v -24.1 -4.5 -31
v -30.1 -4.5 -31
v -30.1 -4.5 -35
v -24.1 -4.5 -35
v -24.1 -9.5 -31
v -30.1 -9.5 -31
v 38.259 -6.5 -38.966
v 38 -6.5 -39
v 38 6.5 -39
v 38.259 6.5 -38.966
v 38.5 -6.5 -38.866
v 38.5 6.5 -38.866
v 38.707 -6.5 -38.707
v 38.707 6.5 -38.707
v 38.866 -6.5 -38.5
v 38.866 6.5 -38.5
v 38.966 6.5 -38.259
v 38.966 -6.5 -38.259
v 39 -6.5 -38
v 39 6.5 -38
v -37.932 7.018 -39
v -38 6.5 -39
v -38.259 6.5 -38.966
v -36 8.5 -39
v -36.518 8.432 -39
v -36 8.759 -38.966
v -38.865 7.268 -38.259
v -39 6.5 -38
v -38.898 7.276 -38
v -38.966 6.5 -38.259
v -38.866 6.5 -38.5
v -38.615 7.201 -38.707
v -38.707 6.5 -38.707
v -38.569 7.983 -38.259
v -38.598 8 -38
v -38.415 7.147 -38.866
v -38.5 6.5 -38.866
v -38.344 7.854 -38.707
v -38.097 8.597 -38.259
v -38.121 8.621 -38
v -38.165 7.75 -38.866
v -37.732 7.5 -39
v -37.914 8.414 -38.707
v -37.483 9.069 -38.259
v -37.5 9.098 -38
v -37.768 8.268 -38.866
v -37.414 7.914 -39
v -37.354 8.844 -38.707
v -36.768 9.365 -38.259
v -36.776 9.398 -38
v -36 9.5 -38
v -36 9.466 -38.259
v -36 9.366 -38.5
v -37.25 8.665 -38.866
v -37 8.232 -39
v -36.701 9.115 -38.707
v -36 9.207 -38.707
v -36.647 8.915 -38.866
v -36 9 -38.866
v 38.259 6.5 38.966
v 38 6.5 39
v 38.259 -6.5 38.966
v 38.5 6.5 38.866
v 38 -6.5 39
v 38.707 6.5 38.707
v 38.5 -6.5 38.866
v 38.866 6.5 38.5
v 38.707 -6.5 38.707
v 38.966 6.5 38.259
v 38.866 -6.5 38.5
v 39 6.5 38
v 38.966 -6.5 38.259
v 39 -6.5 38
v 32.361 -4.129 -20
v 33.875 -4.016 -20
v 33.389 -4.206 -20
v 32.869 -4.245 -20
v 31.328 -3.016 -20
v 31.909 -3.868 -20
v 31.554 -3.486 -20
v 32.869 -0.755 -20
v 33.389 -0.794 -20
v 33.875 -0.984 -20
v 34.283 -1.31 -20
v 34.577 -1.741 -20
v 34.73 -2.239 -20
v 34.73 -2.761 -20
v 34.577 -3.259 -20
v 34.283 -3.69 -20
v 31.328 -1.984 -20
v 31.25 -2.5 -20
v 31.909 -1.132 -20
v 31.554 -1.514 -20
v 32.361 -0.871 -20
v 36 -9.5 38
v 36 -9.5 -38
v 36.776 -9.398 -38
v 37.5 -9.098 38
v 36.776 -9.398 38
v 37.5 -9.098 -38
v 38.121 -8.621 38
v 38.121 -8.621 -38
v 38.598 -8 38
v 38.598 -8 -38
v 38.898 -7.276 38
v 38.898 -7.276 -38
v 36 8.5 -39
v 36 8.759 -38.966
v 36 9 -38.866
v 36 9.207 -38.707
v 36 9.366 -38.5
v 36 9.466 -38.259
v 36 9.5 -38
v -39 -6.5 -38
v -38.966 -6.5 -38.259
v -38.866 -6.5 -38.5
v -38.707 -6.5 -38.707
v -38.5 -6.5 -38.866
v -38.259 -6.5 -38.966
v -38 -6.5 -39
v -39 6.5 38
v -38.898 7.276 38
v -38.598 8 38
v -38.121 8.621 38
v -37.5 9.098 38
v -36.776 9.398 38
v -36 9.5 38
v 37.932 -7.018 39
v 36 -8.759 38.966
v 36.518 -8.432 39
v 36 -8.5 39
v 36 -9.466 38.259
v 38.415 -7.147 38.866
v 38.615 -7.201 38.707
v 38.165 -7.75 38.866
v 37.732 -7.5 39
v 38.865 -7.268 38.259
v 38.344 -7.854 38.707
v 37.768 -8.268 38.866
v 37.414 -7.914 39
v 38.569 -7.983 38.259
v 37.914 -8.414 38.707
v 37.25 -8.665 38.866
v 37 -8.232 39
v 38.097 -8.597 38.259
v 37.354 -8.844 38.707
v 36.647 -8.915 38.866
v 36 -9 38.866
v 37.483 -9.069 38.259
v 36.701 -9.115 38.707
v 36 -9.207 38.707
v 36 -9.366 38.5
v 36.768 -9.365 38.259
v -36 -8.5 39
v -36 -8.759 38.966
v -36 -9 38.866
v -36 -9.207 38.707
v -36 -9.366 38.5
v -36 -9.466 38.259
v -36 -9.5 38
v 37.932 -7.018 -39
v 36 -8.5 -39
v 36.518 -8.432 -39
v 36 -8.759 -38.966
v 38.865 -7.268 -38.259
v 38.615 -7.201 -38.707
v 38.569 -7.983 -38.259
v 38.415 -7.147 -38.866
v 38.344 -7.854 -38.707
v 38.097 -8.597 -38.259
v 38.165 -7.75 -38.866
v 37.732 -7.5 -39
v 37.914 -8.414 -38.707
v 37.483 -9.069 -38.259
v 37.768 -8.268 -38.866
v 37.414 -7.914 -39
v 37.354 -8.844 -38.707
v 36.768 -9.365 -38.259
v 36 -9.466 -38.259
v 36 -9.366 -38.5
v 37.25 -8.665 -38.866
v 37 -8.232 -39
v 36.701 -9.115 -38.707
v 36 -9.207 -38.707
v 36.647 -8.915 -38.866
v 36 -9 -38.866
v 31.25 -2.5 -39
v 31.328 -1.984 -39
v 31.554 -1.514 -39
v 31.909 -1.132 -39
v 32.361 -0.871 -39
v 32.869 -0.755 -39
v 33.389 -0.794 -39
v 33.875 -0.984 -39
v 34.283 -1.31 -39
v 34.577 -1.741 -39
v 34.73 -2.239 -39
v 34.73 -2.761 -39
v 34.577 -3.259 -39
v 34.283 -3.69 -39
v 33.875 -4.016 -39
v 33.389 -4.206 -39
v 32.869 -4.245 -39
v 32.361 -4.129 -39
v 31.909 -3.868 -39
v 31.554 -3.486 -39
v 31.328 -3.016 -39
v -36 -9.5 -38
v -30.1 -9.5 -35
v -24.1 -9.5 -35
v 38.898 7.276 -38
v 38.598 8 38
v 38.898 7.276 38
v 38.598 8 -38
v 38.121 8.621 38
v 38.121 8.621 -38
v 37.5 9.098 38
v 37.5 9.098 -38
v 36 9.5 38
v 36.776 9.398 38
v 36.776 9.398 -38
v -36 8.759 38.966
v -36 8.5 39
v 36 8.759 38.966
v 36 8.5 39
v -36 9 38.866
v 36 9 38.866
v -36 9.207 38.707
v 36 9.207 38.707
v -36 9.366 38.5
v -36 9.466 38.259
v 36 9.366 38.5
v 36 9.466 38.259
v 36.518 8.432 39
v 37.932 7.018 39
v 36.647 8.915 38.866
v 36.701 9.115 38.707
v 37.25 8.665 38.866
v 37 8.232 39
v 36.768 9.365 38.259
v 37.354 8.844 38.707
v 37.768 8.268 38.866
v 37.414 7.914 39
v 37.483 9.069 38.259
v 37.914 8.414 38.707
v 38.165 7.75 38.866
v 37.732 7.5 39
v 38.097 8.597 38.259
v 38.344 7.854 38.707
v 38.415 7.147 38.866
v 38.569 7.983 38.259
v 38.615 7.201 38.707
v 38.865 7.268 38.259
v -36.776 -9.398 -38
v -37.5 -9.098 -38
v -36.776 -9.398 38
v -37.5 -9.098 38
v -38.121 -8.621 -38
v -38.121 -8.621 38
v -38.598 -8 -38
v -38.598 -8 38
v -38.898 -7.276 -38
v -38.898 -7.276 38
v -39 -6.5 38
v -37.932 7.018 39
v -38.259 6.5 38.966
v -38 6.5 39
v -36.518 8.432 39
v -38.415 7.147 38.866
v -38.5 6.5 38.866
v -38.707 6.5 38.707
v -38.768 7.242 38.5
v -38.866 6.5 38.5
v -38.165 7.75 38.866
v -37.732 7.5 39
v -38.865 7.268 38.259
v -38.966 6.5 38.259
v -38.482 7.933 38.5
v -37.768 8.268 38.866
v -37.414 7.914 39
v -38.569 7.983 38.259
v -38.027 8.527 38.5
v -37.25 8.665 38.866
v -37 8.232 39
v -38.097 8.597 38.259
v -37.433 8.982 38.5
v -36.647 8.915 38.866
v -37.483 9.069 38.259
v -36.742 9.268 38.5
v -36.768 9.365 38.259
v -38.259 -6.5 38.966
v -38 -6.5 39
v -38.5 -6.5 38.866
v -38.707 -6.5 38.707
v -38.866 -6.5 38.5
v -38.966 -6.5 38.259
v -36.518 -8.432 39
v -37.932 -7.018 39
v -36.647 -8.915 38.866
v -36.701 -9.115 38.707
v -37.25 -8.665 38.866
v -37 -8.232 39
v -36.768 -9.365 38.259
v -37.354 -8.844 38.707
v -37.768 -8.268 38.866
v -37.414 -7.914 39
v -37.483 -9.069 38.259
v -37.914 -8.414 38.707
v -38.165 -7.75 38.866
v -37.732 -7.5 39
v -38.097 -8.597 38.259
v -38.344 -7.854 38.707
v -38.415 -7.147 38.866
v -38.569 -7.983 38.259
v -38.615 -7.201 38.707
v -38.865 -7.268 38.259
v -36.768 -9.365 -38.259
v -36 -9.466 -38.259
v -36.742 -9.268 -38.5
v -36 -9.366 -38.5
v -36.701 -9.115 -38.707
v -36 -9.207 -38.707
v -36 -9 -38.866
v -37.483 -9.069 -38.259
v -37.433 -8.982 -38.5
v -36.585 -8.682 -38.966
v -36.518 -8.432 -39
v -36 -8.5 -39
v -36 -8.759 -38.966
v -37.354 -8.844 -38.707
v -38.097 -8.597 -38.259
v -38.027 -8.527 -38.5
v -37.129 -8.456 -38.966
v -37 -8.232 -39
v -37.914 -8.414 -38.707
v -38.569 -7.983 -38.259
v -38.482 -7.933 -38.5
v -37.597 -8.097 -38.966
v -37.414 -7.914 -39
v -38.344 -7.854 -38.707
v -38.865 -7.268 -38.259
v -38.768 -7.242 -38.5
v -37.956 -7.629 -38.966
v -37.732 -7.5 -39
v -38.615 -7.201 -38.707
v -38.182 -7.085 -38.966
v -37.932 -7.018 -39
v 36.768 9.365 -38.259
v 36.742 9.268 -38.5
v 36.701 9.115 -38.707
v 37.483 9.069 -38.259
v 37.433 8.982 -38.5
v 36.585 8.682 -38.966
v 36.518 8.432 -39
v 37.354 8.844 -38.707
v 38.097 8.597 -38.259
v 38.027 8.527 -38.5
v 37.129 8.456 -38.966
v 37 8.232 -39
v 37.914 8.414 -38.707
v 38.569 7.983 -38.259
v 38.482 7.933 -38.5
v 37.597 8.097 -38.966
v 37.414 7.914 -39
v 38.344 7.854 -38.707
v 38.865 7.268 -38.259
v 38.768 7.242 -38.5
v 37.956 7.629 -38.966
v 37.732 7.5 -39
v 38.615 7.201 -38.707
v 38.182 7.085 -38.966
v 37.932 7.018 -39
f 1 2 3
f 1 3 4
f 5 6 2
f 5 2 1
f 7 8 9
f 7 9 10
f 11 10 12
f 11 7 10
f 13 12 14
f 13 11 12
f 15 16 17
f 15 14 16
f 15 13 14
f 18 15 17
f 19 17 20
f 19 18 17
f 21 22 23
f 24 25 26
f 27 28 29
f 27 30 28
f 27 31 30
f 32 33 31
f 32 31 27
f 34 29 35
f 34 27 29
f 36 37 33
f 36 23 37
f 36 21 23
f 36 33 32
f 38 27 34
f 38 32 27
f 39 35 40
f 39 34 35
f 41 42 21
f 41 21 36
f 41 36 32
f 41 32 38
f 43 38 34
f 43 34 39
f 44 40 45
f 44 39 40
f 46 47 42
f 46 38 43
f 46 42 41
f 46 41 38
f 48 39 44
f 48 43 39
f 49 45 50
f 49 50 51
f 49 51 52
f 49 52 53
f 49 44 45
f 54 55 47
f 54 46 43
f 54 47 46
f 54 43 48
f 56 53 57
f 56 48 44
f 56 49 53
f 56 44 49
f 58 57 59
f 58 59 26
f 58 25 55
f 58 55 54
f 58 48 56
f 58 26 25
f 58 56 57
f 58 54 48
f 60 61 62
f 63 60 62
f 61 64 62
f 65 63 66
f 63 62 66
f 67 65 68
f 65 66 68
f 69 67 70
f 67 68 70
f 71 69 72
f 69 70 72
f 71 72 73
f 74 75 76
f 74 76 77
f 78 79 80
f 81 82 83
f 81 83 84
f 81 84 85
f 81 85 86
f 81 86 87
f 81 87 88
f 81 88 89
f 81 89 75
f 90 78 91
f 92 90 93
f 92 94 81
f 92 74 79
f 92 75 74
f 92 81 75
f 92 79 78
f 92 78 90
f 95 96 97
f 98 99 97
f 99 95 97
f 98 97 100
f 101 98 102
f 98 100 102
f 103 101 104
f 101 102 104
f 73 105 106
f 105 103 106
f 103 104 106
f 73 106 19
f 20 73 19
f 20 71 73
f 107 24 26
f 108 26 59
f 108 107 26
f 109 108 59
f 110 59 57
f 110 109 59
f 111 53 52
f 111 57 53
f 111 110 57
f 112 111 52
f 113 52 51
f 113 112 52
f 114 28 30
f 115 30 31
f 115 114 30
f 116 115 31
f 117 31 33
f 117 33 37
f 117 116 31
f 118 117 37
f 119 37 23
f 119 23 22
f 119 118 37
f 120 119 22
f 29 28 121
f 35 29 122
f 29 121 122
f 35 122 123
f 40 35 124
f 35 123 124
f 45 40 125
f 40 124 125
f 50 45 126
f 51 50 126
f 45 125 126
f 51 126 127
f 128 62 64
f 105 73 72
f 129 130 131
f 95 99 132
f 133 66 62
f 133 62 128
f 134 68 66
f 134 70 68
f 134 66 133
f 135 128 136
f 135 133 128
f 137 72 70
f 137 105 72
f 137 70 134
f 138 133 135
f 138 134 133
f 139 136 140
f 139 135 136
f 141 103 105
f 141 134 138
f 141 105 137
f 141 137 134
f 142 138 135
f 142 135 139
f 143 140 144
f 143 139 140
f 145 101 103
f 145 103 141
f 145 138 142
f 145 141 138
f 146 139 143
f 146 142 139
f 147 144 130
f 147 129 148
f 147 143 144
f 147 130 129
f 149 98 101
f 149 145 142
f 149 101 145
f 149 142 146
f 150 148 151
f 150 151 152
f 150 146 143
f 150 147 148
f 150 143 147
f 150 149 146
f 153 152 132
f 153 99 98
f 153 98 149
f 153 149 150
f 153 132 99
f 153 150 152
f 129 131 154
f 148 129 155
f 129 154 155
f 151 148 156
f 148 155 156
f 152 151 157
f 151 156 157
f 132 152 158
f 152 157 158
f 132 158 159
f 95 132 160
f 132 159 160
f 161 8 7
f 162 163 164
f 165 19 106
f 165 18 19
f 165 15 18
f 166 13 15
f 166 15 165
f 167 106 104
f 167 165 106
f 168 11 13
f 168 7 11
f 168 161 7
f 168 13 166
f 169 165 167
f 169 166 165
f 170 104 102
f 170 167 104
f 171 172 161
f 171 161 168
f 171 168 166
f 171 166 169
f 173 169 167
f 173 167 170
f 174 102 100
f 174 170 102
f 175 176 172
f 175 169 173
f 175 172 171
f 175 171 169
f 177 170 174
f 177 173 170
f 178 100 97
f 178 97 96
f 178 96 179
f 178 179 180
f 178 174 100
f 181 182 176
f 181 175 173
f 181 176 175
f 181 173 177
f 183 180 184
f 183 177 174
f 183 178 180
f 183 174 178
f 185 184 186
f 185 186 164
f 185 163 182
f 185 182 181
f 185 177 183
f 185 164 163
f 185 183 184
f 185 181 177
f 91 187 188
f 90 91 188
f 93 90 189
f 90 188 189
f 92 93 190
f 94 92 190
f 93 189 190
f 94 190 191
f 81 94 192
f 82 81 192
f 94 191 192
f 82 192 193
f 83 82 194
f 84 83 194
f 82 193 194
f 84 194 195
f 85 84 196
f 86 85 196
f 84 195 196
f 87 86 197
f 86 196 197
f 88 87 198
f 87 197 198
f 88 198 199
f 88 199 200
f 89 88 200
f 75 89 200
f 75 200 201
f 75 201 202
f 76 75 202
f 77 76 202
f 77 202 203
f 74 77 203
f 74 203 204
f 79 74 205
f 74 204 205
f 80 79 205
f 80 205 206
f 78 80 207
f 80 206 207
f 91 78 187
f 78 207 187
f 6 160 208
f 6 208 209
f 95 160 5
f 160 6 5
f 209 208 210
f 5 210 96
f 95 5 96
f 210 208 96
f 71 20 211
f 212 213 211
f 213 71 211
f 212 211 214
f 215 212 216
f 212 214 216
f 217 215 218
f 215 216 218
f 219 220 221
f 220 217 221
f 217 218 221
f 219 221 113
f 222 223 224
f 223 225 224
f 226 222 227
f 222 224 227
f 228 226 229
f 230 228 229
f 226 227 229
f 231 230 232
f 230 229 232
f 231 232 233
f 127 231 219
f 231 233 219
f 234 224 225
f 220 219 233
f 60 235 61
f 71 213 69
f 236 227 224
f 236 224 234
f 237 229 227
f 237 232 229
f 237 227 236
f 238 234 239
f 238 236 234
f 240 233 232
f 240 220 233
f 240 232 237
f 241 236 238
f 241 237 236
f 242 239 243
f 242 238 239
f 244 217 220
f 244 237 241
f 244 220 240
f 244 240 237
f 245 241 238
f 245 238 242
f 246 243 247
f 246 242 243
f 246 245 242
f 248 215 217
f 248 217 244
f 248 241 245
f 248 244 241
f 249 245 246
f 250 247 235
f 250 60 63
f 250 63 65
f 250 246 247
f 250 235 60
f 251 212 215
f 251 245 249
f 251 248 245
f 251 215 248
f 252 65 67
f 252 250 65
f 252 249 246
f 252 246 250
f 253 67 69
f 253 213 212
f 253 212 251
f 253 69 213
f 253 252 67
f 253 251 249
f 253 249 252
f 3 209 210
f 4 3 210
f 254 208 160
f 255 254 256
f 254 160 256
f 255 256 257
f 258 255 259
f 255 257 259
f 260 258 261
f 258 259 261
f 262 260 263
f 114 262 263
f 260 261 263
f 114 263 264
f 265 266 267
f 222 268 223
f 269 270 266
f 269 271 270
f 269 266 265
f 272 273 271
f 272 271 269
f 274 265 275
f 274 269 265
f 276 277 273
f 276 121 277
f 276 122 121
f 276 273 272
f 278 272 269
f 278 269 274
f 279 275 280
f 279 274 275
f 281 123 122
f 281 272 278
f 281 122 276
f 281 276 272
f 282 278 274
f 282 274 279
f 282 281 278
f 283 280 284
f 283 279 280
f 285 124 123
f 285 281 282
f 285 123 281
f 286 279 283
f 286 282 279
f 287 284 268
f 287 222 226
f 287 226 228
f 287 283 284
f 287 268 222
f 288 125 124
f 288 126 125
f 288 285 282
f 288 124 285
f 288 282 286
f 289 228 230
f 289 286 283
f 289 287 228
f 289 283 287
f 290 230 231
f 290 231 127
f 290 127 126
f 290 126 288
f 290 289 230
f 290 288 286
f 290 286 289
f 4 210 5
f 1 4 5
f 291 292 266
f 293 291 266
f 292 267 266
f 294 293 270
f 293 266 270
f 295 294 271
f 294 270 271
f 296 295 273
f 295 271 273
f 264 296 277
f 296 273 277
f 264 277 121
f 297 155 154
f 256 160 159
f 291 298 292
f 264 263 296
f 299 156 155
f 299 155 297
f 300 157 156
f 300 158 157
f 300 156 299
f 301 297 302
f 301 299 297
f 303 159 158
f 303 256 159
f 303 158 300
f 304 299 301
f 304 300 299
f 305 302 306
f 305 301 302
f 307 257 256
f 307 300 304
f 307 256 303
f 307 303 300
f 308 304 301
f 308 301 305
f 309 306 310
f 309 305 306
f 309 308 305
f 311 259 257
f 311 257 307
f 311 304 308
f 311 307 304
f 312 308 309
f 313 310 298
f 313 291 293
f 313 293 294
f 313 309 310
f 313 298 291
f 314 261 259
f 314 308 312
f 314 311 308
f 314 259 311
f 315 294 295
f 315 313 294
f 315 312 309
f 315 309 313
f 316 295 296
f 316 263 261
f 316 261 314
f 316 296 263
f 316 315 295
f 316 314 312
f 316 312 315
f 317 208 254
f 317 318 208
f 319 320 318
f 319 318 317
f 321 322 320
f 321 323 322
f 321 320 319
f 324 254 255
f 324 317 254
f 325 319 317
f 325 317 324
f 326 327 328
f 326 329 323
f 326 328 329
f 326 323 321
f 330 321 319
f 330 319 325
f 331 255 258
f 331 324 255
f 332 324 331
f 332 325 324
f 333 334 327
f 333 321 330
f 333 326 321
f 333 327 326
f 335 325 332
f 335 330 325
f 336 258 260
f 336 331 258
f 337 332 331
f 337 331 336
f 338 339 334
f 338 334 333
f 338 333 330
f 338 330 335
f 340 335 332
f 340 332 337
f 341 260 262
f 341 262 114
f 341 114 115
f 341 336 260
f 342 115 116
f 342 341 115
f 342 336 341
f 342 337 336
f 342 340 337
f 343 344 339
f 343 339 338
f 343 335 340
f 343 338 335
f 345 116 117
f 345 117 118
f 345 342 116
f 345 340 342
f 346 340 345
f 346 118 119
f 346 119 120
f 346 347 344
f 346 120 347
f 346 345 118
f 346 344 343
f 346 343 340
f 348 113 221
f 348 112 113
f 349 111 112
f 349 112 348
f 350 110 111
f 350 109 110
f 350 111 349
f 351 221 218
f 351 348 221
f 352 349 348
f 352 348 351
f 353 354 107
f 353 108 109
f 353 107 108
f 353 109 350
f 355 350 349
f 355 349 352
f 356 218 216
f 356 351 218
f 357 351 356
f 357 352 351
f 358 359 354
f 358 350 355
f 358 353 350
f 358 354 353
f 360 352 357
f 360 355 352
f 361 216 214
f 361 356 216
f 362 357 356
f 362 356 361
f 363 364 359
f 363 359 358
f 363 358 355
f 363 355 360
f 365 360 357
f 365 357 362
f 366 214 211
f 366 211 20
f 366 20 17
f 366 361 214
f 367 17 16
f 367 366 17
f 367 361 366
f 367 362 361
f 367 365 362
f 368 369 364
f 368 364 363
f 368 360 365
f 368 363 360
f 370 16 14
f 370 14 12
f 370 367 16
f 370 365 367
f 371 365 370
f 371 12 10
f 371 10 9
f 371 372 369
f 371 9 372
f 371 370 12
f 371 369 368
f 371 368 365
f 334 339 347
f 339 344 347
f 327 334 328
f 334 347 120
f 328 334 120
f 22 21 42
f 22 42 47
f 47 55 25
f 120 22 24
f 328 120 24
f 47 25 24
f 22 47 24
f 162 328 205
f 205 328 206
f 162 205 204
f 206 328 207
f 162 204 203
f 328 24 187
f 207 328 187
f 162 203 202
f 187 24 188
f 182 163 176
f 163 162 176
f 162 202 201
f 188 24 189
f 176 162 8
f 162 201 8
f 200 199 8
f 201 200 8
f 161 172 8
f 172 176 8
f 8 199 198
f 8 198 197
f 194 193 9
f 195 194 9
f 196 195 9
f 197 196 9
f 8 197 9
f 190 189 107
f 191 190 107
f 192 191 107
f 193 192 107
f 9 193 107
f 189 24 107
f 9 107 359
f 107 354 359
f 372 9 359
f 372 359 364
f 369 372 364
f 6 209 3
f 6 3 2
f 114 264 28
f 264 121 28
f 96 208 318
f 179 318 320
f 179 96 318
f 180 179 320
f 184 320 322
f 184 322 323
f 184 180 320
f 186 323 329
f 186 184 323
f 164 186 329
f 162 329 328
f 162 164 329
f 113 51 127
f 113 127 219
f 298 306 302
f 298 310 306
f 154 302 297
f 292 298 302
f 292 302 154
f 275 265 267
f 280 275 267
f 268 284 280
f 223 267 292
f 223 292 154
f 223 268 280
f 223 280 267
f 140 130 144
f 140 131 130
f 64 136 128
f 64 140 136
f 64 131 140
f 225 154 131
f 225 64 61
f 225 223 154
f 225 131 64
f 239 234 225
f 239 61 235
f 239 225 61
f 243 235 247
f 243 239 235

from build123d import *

# Parameters (mm, degrees)
SKETCH1_W           = 78
SKETCH1_H           = 78
BOSS_EXTRUDE1_DEPTH = 9.5
SKETCH2_R           = 1.75
CUT_EXTRUDE1_DEPTH  = 19
SKETCH3_W           = 6
SKETCH3_H           = 4
CUT_EXTRUDE2_DEPTH  = 5
FILLET2_R           = 1
FILLET3_R           = 3
FILLET4_R           = 1


with BuildPart() as part:
    # Sketch1 → Boss-Extrude1 (new, symmetric)
    with BuildSketch(Plane(origin=(0, 0, 0), x_dir=(1, 0, 0), z_dir=(0, 1, 0))):
        Rectangle(SKETCH1_W, SKETCH1_H)
    extrude(amount=BOSS_EXTRUDE1_DEPTH, both=True)

    # Sketch2 → Cut-Extrude1 (cut)
    with BuildSketch(Plane(origin=(0, 0, -39), x_dir=(-1, 0, 0), z_dir=(0, 0, -1))):
        with Locations((-33, -2.5)):
            Circle(SKETCH2_R)
    extrude(amount=-CUT_EXTRUDE1_DEPTH, mode=Mode.SUBTRACT)

    # Sketch3 → Cut-Extrude2 (cut)
    with BuildSketch(Plane.XZ.offset(9.5)):
        with Locations((-27.1, -33)):
            Rectangle(SKETCH3_W, SKETCH3_H)
    extrude(amount=-CUT_EXTRUDE2_DEPTH, mode=Mode.SUBTRACT)

    # Fillet2
    fillet2_edges = [part.edges().sort_by_distance(p)[0] for p in [
        (0, -9.5, -39),
        (-39, 0, -39),
        (39, 0, -39),
        (0, 9.5, -39),
    ]]
    fillet(fillet2_edges, radius=FILLET2_R)

    # Fillet3
    # the kernel refuses this fillet: 3 mm, written as the material it takes off along each edge
    with BuildSketch(Plane(origin=(36, 6.5, -39), x_dir=(0, 1, 0), z_dir=(-1, 0, 0))) as fillet3_piece_1:
        with BuildLine():
            CenterArc((2, -1), 1, 0, 90)
            Line((3, -1), (3, 0))
            Line((3, 0), (2, 0))
        make_face()
    revolve(axis=Axis((36, 6.5, -39), (0, 0, -1)), revolution_arc=90, mode=Mode.SUBTRACT)
    with BuildSketch(Plane(origin=(36, -6.5, -39), x_dir=(1, 0, 0), z_dir=(0, 1, 0))) as fillet3_piece_2:
        with BuildLine():
            CenterArc((2, -1), 1, 0, 90)
            Line((3, -1), (3, 0))
            Line((3, 0), (2, 0))
        make_face()
    revolve(axis=Axis((36, -6.5, -39), (0, 0, -1)), revolution_arc=90, mode=Mode.SUBTRACT)
    with BuildSketch(Plane(origin=(-36, 6.5, -39), x_dir=(-1, 0, 0), z_dir=(0, -1, 0))) as fillet3_piece_3:
        with BuildLine():
            CenterArc((2, -1), 1, 0, 90)
            Line((3, -1), (3, 0))
            Line((3, 0), (2, 0))
        make_face()
    revolve(axis=Axis((-36, 6.5, -39), (0, 0, -1)), revolution_arc=90, mode=Mode.SUBTRACT)
    with BuildSketch(Plane(origin=(-36, -6.5, -39), x_dir=(0, -1, 0), z_dir=(1, 0, 0))) as fillet3_piece_4:
        with BuildLine():
            CenterArc((2, -1), 1, 0, 90)
            Line((3, -1), (3, 0))
            Line((3, 0), (2, 0))
        make_face()
    revolve(axis=Axis((-36, -6.5, -39), (0, 0, -1)), revolution_arc=90, mode=Mode.SUBTRACT)
    with BuildSketch(Plane(origin=(-39, -9.5, 46.5), x_dir=(1, 0, 0), z_dir=(0, 0, -1)), Plane(origin=(-39, 9.5, 46.5), x_dir=(0, -1, 0), z_dir=(0, 0, -1)), Plane(origin=(39, 9.5, -39), x_dir=(0, -1, 0), z_dir=(0, 0, 1)), Plane(origin=(39, -9.5, -39), x_dir=(-1, 0, 0), z_dir=(0, 0, 1))) as fillet3_piece_5:
        with BuildLine():
            CenterArc((FILLET3_R, -FILLET3_R), FILLET3_R, 90, 90)
            Line((0, -FILLET3_R), (0, 0))
            Line((0, 0), (FILLET3_R, 0))
        make_face()
    extrude(amount=85.5, mode=Mode.SUBTRACT)

    # Fillet4
    fillet4_edges = [part.edges().sort_by_distance(p)[0] for p in [
        (0, 9.5, 39),
        (0, -9.5, 39),
        (39, 0, 39),
        (-39, 0, 39),
        (38.121320344, -8.621320344, 39),
        (38.121320344, 8.621320344, 39),
        (-38.121320344, -8.621320344, 39),
        (-38.121320344, 8.621320344, 39),
    ]]
    fillet(fillet4_edges, radius=FILLET4_R)


solid = part.part
